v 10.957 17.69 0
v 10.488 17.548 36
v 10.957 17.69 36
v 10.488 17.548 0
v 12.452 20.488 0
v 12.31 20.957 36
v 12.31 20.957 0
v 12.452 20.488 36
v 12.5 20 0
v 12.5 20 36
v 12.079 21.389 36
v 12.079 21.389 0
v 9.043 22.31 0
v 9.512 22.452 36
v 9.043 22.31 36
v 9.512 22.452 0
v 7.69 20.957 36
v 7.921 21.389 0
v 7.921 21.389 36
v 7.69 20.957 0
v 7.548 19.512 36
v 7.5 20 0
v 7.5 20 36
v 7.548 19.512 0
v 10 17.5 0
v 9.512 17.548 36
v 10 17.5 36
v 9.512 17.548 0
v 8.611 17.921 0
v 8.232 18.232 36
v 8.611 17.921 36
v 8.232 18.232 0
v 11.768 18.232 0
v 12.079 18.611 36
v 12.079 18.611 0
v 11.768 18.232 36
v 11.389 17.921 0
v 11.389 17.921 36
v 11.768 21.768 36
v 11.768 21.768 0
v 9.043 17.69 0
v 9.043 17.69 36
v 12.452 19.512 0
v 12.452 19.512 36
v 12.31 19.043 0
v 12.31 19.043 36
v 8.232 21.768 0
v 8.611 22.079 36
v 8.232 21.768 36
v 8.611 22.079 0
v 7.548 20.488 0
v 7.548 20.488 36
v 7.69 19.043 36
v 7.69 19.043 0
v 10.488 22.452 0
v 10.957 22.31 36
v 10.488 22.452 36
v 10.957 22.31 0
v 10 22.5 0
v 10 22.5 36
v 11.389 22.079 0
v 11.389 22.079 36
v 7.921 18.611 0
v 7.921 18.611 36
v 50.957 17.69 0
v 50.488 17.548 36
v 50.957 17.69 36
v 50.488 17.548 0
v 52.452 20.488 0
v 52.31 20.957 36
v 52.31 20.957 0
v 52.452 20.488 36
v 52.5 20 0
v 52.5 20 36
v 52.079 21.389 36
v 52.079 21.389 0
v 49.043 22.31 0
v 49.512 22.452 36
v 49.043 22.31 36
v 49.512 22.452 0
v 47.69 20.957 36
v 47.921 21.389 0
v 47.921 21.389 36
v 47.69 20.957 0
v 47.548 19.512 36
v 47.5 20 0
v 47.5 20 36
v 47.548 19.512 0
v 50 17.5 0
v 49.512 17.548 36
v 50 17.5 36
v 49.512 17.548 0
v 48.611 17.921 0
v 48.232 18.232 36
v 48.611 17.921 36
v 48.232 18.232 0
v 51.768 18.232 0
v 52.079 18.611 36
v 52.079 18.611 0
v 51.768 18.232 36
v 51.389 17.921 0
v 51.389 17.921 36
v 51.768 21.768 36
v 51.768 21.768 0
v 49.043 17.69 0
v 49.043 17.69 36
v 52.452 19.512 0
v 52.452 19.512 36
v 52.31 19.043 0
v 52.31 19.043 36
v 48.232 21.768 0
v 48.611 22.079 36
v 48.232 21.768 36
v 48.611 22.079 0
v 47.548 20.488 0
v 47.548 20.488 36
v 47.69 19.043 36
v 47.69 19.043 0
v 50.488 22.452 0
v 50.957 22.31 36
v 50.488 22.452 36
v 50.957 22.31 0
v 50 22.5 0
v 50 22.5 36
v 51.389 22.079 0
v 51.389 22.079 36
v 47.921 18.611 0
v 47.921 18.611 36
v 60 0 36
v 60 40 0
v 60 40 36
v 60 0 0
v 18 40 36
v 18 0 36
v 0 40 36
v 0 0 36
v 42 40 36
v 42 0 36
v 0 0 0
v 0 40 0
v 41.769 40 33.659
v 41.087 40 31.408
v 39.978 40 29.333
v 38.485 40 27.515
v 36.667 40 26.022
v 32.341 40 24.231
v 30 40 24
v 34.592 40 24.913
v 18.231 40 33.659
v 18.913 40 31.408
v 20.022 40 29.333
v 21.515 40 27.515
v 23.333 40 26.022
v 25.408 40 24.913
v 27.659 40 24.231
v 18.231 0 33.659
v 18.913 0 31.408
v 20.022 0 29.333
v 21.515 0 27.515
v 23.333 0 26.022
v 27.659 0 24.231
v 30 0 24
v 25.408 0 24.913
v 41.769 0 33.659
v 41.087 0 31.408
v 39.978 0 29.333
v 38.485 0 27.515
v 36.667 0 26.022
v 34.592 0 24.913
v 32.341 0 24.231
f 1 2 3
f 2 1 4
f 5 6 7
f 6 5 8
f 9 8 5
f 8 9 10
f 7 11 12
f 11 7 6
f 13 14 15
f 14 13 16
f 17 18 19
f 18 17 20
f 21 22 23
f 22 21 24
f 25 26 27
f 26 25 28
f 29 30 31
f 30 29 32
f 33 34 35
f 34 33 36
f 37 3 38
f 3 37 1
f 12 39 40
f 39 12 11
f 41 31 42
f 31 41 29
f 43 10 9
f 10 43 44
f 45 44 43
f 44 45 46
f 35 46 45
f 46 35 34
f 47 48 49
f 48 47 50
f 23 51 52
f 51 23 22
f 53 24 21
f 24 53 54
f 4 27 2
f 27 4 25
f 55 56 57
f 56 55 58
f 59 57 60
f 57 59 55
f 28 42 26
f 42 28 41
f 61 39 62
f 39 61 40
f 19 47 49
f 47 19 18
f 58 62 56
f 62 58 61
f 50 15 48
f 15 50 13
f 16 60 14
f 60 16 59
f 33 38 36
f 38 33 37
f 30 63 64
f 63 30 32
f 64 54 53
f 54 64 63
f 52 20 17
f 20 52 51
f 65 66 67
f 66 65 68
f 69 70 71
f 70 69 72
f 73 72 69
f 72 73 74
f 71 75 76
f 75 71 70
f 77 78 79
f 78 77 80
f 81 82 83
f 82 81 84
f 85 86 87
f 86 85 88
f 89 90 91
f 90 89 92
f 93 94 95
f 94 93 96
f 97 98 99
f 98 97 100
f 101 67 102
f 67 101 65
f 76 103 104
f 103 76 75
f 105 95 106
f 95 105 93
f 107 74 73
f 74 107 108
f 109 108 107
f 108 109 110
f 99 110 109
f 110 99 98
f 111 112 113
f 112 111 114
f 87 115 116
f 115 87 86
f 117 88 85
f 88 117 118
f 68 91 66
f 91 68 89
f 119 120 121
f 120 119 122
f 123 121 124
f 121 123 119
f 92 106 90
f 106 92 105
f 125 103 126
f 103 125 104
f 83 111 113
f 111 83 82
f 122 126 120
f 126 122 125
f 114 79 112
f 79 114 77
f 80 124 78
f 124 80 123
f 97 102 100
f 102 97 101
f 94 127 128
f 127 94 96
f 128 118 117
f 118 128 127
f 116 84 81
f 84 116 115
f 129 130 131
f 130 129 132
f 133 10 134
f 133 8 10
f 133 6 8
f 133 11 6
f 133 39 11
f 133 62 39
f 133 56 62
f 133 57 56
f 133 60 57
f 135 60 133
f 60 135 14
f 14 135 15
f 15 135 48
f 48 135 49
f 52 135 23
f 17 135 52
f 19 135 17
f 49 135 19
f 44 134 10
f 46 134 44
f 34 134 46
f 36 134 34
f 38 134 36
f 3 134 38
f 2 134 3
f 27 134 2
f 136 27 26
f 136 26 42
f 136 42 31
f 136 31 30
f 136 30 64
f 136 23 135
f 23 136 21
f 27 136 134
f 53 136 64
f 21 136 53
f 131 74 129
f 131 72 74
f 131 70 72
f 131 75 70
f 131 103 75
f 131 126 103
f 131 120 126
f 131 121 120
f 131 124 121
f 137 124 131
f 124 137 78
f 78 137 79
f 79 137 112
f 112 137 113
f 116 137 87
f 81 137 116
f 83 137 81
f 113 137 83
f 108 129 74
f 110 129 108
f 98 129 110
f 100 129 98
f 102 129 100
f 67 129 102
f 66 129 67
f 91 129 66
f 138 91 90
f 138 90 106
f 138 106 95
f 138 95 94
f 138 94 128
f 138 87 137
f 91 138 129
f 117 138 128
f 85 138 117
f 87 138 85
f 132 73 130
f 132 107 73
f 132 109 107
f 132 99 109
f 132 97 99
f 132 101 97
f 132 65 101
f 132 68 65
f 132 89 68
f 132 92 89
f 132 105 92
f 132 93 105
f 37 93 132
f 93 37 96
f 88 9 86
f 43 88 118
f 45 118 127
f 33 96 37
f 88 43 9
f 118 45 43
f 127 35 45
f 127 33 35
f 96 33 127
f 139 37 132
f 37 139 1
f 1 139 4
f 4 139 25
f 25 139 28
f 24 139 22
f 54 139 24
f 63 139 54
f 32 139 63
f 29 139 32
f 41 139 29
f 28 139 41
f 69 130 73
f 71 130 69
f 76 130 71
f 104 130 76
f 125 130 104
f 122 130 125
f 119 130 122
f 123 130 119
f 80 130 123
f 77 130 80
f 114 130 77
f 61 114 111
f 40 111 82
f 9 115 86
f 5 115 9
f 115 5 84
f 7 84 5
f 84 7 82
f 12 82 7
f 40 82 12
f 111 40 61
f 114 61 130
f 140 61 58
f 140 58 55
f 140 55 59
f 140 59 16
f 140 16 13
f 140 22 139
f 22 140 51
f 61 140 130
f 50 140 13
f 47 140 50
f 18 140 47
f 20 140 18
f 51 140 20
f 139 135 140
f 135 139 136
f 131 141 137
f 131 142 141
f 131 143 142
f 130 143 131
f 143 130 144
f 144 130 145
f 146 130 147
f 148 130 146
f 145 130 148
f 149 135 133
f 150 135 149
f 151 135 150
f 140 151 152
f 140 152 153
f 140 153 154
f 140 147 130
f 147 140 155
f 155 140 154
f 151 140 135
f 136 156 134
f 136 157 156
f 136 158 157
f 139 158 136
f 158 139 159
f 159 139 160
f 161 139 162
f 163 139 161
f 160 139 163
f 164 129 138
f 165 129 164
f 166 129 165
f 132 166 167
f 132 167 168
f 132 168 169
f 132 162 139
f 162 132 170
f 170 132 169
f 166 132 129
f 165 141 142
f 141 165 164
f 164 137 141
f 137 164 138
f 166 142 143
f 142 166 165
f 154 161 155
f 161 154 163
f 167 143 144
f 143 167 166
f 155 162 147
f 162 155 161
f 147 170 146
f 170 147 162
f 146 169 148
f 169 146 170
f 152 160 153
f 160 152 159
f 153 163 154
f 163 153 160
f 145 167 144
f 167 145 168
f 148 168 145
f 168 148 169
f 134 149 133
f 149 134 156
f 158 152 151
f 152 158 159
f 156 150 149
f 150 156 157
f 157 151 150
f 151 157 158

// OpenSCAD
$fn = 32;

// ----------------------------------------------------------------------
// Saddle clamp: plain shaft clamp
// ----------------------------------------------------------------------

// --- parameters (mm) ---
blk_l = 60;               // block length, X
blk_w = 40;               // block width, Y
blk_h = 36;               // block height
clamp_r = 12;             // shaft groove radius
hole_r = 2.5;             // bolt hole radius
hole_m = 10;              // bolt hole margin from the ends

saw_depth = clamp_r + 3;  // saw kerf depth

difference() {
  cube([blk_l, blk_w, blk_h]);
  translate([blk_l / 2, -1, blk_h])
    rotate([-90, 0, 0])
      cylinder(h = blk_w + 2, r = clamp_r);
  for (sx = [0, 1])
    translate([sx ? blk_l - hole_m : hole_m, blk_w / 2, -1])
      cylinder(r = hole_r, h = blk_h + 2);
}
